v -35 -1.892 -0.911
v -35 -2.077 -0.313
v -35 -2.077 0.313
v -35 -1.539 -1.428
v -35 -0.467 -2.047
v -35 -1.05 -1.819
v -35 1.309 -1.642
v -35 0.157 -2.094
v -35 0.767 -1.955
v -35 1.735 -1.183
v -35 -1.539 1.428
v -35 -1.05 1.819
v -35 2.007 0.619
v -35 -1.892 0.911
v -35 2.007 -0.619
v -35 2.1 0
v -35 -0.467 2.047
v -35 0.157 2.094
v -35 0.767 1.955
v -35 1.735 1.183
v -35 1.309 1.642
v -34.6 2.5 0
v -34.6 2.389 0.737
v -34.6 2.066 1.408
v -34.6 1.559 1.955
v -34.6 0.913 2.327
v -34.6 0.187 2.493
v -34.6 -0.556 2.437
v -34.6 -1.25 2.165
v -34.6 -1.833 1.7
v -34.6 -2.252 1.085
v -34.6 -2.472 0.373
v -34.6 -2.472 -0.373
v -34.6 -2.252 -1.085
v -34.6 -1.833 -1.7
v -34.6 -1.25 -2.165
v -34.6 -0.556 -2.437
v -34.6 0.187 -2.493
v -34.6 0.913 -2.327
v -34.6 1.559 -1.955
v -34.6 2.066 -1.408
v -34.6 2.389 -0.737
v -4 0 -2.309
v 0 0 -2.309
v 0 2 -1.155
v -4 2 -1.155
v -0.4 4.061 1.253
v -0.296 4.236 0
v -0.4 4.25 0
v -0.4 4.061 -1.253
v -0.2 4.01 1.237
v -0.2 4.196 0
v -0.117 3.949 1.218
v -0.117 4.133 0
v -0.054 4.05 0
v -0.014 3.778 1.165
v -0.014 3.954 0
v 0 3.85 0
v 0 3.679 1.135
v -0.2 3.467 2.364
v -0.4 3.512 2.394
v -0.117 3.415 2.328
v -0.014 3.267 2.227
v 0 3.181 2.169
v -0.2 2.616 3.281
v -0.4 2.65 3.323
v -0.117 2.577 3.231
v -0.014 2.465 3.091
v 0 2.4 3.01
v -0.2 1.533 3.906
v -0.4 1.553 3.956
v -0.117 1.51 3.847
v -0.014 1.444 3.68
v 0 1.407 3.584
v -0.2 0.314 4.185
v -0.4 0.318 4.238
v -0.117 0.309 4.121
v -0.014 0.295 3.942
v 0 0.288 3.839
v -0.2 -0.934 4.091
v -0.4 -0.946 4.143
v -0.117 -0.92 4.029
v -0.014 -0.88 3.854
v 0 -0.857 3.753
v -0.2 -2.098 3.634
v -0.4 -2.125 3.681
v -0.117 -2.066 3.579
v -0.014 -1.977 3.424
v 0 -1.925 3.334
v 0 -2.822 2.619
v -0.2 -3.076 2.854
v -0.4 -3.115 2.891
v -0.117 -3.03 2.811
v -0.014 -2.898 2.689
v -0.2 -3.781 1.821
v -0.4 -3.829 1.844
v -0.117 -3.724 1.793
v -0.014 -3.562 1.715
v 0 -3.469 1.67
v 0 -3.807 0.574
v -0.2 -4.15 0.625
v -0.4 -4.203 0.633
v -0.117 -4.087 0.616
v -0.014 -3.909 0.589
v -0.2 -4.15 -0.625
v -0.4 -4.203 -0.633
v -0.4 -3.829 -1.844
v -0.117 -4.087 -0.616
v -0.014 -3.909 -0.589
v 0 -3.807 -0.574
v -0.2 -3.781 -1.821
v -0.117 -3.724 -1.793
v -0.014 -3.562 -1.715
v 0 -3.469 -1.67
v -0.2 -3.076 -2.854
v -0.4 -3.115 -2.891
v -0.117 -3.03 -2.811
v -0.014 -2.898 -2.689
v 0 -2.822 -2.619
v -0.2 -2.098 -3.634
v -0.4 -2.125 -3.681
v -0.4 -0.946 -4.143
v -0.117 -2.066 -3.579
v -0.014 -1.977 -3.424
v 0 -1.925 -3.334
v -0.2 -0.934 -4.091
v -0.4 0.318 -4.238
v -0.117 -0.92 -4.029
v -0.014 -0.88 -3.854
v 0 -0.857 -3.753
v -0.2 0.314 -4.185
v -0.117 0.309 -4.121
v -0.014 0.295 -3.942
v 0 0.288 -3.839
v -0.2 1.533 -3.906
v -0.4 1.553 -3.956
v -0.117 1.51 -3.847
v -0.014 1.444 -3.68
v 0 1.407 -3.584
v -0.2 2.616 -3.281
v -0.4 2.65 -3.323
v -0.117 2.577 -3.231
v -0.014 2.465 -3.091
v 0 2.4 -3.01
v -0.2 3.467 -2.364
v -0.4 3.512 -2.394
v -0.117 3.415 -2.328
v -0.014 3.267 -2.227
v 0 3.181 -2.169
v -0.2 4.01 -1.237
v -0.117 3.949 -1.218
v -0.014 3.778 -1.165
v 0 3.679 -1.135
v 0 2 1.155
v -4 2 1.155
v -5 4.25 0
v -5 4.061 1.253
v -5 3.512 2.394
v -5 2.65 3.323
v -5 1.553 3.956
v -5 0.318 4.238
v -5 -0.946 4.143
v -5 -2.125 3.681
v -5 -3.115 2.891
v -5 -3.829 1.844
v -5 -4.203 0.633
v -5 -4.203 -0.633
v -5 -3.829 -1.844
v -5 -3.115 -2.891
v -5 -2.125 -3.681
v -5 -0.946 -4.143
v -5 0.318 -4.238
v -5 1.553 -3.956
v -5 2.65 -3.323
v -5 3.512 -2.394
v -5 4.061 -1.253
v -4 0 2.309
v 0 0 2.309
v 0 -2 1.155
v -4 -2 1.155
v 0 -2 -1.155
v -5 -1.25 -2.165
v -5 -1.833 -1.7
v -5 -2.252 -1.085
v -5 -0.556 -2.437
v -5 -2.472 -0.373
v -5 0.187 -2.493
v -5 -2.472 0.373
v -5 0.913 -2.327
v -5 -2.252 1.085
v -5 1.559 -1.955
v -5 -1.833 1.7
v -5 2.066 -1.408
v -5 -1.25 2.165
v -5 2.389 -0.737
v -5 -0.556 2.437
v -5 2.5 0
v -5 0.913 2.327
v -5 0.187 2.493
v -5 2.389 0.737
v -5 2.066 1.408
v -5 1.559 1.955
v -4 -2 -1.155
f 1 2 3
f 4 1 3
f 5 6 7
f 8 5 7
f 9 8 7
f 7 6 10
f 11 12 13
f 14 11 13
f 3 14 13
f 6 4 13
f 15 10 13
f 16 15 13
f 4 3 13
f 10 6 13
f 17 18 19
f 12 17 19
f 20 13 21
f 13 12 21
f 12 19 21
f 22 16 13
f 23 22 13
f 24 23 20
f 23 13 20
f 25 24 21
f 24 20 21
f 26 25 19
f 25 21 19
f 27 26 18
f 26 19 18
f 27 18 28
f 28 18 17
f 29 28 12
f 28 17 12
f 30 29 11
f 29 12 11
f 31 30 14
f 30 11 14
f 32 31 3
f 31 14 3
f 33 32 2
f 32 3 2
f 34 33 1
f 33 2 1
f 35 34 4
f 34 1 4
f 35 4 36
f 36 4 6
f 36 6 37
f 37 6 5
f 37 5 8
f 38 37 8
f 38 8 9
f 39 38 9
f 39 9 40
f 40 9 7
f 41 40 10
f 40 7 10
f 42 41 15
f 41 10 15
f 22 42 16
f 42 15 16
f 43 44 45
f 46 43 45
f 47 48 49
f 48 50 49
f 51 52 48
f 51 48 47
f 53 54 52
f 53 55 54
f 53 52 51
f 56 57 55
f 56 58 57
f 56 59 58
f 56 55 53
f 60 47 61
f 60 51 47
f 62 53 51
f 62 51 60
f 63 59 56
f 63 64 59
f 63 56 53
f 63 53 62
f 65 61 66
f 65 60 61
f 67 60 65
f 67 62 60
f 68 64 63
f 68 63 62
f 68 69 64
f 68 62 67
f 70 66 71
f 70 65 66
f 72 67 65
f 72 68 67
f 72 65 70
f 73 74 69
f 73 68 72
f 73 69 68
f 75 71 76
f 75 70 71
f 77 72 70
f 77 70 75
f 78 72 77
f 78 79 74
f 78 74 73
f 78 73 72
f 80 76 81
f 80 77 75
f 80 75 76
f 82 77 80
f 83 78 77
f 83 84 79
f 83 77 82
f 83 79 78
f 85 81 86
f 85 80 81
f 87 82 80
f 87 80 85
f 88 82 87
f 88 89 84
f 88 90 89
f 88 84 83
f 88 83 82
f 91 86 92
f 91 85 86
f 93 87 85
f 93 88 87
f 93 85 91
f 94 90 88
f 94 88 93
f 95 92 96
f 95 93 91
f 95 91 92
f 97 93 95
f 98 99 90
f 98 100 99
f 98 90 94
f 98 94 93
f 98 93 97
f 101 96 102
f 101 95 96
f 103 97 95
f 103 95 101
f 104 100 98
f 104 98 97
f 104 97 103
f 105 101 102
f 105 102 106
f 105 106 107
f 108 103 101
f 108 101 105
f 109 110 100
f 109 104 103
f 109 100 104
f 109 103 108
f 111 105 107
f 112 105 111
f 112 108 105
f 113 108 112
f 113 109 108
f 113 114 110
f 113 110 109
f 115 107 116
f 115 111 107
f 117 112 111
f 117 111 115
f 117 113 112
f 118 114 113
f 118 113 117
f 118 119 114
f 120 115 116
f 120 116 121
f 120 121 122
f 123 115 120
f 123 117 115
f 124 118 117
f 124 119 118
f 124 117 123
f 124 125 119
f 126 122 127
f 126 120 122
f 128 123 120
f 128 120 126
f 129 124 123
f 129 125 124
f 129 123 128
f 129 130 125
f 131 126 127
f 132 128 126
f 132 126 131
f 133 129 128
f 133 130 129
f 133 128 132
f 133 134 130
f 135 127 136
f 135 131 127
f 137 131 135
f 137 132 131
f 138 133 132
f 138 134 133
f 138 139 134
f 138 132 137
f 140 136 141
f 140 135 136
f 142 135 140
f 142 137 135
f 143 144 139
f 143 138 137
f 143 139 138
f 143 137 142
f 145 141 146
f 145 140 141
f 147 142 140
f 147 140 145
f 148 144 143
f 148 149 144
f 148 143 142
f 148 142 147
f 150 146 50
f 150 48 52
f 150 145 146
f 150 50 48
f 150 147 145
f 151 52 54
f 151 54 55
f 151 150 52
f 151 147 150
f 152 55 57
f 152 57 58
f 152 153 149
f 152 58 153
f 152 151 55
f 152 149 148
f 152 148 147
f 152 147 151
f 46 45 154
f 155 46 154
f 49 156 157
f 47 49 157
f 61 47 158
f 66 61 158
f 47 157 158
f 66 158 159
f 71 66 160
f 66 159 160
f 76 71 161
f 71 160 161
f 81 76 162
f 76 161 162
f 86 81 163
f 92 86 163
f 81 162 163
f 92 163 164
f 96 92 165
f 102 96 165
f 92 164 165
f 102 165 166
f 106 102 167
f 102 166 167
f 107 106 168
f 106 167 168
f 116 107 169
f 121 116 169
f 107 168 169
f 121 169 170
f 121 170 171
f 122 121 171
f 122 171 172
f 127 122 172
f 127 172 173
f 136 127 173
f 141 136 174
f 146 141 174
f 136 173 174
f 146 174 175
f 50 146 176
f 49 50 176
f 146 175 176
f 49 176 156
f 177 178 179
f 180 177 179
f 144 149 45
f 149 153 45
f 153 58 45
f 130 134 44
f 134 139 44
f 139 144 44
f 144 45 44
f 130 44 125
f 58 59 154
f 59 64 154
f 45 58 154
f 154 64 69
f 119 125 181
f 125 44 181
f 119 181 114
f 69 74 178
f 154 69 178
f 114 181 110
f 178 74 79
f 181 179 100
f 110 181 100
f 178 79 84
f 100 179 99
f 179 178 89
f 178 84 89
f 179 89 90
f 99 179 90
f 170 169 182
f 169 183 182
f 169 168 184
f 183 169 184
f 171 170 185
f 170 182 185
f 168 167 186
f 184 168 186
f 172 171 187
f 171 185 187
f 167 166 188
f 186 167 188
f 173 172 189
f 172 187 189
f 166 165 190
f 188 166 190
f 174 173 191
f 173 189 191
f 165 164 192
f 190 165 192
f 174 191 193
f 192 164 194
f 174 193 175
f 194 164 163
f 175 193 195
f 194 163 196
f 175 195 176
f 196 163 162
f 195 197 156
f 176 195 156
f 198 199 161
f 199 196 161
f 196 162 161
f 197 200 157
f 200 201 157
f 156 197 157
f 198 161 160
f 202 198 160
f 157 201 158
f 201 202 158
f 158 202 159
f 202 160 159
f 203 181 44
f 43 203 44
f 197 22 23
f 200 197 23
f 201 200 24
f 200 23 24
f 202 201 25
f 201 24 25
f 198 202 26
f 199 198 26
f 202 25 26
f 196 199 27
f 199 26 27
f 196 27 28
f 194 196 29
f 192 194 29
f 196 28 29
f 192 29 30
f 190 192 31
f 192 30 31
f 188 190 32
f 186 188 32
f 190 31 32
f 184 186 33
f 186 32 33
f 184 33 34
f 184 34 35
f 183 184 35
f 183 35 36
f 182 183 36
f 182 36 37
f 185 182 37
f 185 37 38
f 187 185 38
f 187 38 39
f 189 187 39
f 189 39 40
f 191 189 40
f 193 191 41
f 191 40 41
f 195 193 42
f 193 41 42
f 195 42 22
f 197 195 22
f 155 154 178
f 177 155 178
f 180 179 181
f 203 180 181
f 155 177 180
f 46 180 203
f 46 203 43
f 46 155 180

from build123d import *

# Parameters (mm, degrees)
SFAZOWANIE1_SIZE           = 0.4
ZAOKR_GLENIE1_R            = 0.4
WYTNIJ_WYCI_GNI_CIE1_DEPTH = 4


with BuildPart() as part:
    # Szkic1 → Obrót1 (revolve)
    with BuildSketch(Plane.XY):
        Polygon((0, 0), (0, 4.25), (-5, 4.25), (-5, 2.5), (-35, 2.5), (-35, 0), align=None)
    revolve(axis=Axis((-123.158940217, 0, 0), (1, 0, 0)))

    # Sfazowanie1
    sfazowanie1_edges = [part.edges().sort_by_distance(p)[0] for p in [
        (-35, -2.5, 0),
    ]]
    chamfer(sfazowanie1_edges, length=SFAZOWANIE1_SIZE)

    # Zaokrąglenie1
    zaokr_glenie1_edges = [part.edges().sort_by_distance(p)[0] for p in [
        (0, -4.25, 0),
    ]]
    fillet(zaokr_glenie1_edges, radius=ZAOKR_GLENIE1_R)

    # Szkic2 → Wytnij-wyciągnięcie1 (cut)
    with BuildSketch(Plane(origin=(0, 0, 0), x_dir=(0, 0, -1), z_dir=(1, 0, 0))):
        Polygon((2.309401077, 0), (1.154700538, 2), (-1.154700538, 2), (-2.309401077, 0), (-1.154700538, -2), (1.154700538, -2), align=None)
    extrude(amount=-WYTNIJ_WYCI_GNI_CIE1_DEPTH, mode=Mode.SUBTRACT)


solid = part.part
